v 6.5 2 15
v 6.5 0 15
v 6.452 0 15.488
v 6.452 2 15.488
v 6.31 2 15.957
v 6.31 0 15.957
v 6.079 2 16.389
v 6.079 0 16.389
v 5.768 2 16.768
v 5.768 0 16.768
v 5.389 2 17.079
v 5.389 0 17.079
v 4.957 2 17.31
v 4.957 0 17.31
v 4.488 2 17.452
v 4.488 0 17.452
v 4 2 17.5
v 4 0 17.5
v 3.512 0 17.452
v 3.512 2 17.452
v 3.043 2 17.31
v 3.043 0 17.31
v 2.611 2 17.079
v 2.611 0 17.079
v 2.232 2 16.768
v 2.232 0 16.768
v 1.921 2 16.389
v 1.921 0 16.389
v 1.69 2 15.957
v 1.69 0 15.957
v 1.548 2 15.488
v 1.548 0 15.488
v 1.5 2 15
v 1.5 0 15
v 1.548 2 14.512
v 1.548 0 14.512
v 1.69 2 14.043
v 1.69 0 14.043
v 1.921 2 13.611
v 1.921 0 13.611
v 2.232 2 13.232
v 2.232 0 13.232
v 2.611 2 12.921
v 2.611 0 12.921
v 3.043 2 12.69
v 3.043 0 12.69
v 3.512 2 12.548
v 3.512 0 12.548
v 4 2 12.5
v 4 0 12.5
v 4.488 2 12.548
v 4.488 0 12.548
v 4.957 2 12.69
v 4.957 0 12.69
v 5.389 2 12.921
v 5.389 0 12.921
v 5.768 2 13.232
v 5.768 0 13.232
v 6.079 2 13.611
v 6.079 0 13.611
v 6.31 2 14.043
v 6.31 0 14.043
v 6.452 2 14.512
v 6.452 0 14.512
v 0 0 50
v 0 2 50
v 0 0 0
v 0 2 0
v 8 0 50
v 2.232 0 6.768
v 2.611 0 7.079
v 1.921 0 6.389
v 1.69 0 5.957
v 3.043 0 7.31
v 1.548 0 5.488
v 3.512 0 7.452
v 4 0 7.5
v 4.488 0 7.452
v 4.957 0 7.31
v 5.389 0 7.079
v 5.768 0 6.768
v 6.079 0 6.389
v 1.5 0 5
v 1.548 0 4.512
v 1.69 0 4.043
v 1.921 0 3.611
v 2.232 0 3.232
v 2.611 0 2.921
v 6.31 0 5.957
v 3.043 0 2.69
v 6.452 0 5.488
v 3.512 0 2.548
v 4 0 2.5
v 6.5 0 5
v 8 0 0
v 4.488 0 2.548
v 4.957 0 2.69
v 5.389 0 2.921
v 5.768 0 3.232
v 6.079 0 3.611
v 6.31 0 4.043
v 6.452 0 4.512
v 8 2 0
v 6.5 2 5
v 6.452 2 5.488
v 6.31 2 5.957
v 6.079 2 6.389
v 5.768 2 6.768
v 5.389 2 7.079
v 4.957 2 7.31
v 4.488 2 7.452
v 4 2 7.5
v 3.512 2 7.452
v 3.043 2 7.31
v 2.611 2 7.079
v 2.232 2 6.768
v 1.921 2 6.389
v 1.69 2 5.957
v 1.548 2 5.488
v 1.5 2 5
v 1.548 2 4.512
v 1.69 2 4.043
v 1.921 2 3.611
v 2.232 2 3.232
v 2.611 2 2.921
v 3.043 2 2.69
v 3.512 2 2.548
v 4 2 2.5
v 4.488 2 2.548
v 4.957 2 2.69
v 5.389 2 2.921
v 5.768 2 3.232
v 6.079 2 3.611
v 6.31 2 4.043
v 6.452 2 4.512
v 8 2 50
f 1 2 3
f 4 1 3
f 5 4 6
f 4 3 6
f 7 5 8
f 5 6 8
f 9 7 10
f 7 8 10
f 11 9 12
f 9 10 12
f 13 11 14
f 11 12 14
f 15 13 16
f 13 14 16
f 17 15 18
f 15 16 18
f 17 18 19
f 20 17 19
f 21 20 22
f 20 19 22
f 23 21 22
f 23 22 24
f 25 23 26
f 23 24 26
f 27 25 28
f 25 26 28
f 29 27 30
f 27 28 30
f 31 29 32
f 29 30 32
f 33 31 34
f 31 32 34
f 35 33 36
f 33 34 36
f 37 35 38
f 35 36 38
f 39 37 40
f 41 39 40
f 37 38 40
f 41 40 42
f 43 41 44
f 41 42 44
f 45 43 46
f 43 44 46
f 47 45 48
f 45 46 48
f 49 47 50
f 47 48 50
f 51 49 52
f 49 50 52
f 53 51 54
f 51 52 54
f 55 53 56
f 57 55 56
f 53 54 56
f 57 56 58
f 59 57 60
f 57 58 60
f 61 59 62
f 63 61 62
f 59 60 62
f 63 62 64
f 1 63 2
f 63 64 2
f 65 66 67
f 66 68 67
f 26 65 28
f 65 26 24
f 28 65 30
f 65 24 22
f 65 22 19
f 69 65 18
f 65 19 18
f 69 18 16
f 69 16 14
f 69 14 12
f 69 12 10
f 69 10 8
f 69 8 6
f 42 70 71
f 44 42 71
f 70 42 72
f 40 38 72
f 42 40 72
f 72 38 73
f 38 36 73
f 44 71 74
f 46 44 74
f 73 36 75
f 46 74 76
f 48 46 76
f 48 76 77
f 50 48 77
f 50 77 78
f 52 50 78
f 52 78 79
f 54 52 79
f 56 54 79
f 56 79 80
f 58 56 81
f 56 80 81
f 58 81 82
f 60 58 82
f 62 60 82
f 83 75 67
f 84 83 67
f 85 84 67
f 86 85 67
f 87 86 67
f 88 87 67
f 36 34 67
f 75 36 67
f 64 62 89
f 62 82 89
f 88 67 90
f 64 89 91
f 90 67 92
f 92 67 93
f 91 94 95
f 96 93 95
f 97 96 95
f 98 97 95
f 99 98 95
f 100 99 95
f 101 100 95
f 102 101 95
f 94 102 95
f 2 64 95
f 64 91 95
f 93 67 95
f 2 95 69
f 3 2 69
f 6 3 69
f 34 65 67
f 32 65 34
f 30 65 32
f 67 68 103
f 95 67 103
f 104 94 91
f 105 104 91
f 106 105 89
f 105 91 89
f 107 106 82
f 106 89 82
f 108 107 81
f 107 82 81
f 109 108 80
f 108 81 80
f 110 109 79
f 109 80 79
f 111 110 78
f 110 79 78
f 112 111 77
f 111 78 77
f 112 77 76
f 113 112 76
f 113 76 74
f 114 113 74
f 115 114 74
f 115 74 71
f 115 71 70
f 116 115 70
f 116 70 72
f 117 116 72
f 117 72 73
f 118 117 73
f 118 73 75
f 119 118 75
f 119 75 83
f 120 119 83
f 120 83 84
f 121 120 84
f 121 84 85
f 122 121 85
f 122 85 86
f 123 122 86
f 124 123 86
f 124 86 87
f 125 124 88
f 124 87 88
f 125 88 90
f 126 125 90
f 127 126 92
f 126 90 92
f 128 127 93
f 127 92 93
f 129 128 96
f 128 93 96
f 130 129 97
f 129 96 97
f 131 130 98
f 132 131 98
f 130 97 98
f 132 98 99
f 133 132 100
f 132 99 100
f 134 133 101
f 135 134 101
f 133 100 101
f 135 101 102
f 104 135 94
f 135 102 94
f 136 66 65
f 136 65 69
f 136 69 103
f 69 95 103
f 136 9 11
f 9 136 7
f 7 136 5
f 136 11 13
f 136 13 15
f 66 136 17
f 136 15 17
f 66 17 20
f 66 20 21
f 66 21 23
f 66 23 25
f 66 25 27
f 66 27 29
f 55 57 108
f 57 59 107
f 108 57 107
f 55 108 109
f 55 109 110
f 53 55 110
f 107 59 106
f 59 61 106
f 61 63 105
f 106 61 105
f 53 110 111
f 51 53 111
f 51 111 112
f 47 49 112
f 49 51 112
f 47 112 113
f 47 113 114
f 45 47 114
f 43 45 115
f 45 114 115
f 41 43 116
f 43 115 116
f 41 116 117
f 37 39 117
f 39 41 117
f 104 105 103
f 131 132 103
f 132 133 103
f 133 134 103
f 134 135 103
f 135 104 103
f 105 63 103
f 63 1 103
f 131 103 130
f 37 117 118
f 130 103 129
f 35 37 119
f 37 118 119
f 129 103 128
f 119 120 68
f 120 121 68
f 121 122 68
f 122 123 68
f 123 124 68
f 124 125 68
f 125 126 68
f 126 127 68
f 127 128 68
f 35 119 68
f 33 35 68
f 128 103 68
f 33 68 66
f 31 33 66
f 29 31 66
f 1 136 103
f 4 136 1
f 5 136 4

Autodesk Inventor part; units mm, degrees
ref_plane "YZ Plane" through (0, 0, 0) normal (1, 0, 0) x (0, 1, 0)
ref_plane "XZ Plane" through (0, 0, 0) normal (0, 1, 0) x (-1, 0, 0)
ref_plane "XY Plane" through (0, 0, 0) normal (0, 0, 1) x (1, 0, 0)
sketch "Sketch1" plane through (0, 0, 0) normal (0, 0, 1) x (1, 0, 0)
  line L0 (0, 0) -> (8, 0)
  line L1 (8, 0) -> (8, 2)
  line L2 (8, 2) -> (0, 2)
  line L3 (0, 2) -> (0, 0)
  dimension "d0" = 8
  dimension "d1" = 2
extrude "Extrusion1" add sketch "Sketch1" along normal blind 50
sketch "Sketch2" plane through (0, 0, 0) normal (0, -1, 0) x (1, 0, 0)
  circle A0 centre (4, 5) radius 2.5
  circle A1 centre (4, 15) radius 2.5
  line L0 (0, 0) -> (8, 0) projected
  line L1 (8, 0) -> (8, 50) projected
  line L2 (0, 50) -> (8, 50) projected
  line L3 (0, 0) -> (0, 50) projected
  dimension "d4" = 5
  dimension "d5" = 5
  dimension "d6" = 5
  dimension "d7" = 10
  dimension "d8" = 4
  dimension "d9" = 4
extrude "Extrusion2" cut sketch "Sketch2" against normal up to next contours A0 | A1
properties part number "Y_Rail_Limit_Rod-SquareBar-Rev3"
